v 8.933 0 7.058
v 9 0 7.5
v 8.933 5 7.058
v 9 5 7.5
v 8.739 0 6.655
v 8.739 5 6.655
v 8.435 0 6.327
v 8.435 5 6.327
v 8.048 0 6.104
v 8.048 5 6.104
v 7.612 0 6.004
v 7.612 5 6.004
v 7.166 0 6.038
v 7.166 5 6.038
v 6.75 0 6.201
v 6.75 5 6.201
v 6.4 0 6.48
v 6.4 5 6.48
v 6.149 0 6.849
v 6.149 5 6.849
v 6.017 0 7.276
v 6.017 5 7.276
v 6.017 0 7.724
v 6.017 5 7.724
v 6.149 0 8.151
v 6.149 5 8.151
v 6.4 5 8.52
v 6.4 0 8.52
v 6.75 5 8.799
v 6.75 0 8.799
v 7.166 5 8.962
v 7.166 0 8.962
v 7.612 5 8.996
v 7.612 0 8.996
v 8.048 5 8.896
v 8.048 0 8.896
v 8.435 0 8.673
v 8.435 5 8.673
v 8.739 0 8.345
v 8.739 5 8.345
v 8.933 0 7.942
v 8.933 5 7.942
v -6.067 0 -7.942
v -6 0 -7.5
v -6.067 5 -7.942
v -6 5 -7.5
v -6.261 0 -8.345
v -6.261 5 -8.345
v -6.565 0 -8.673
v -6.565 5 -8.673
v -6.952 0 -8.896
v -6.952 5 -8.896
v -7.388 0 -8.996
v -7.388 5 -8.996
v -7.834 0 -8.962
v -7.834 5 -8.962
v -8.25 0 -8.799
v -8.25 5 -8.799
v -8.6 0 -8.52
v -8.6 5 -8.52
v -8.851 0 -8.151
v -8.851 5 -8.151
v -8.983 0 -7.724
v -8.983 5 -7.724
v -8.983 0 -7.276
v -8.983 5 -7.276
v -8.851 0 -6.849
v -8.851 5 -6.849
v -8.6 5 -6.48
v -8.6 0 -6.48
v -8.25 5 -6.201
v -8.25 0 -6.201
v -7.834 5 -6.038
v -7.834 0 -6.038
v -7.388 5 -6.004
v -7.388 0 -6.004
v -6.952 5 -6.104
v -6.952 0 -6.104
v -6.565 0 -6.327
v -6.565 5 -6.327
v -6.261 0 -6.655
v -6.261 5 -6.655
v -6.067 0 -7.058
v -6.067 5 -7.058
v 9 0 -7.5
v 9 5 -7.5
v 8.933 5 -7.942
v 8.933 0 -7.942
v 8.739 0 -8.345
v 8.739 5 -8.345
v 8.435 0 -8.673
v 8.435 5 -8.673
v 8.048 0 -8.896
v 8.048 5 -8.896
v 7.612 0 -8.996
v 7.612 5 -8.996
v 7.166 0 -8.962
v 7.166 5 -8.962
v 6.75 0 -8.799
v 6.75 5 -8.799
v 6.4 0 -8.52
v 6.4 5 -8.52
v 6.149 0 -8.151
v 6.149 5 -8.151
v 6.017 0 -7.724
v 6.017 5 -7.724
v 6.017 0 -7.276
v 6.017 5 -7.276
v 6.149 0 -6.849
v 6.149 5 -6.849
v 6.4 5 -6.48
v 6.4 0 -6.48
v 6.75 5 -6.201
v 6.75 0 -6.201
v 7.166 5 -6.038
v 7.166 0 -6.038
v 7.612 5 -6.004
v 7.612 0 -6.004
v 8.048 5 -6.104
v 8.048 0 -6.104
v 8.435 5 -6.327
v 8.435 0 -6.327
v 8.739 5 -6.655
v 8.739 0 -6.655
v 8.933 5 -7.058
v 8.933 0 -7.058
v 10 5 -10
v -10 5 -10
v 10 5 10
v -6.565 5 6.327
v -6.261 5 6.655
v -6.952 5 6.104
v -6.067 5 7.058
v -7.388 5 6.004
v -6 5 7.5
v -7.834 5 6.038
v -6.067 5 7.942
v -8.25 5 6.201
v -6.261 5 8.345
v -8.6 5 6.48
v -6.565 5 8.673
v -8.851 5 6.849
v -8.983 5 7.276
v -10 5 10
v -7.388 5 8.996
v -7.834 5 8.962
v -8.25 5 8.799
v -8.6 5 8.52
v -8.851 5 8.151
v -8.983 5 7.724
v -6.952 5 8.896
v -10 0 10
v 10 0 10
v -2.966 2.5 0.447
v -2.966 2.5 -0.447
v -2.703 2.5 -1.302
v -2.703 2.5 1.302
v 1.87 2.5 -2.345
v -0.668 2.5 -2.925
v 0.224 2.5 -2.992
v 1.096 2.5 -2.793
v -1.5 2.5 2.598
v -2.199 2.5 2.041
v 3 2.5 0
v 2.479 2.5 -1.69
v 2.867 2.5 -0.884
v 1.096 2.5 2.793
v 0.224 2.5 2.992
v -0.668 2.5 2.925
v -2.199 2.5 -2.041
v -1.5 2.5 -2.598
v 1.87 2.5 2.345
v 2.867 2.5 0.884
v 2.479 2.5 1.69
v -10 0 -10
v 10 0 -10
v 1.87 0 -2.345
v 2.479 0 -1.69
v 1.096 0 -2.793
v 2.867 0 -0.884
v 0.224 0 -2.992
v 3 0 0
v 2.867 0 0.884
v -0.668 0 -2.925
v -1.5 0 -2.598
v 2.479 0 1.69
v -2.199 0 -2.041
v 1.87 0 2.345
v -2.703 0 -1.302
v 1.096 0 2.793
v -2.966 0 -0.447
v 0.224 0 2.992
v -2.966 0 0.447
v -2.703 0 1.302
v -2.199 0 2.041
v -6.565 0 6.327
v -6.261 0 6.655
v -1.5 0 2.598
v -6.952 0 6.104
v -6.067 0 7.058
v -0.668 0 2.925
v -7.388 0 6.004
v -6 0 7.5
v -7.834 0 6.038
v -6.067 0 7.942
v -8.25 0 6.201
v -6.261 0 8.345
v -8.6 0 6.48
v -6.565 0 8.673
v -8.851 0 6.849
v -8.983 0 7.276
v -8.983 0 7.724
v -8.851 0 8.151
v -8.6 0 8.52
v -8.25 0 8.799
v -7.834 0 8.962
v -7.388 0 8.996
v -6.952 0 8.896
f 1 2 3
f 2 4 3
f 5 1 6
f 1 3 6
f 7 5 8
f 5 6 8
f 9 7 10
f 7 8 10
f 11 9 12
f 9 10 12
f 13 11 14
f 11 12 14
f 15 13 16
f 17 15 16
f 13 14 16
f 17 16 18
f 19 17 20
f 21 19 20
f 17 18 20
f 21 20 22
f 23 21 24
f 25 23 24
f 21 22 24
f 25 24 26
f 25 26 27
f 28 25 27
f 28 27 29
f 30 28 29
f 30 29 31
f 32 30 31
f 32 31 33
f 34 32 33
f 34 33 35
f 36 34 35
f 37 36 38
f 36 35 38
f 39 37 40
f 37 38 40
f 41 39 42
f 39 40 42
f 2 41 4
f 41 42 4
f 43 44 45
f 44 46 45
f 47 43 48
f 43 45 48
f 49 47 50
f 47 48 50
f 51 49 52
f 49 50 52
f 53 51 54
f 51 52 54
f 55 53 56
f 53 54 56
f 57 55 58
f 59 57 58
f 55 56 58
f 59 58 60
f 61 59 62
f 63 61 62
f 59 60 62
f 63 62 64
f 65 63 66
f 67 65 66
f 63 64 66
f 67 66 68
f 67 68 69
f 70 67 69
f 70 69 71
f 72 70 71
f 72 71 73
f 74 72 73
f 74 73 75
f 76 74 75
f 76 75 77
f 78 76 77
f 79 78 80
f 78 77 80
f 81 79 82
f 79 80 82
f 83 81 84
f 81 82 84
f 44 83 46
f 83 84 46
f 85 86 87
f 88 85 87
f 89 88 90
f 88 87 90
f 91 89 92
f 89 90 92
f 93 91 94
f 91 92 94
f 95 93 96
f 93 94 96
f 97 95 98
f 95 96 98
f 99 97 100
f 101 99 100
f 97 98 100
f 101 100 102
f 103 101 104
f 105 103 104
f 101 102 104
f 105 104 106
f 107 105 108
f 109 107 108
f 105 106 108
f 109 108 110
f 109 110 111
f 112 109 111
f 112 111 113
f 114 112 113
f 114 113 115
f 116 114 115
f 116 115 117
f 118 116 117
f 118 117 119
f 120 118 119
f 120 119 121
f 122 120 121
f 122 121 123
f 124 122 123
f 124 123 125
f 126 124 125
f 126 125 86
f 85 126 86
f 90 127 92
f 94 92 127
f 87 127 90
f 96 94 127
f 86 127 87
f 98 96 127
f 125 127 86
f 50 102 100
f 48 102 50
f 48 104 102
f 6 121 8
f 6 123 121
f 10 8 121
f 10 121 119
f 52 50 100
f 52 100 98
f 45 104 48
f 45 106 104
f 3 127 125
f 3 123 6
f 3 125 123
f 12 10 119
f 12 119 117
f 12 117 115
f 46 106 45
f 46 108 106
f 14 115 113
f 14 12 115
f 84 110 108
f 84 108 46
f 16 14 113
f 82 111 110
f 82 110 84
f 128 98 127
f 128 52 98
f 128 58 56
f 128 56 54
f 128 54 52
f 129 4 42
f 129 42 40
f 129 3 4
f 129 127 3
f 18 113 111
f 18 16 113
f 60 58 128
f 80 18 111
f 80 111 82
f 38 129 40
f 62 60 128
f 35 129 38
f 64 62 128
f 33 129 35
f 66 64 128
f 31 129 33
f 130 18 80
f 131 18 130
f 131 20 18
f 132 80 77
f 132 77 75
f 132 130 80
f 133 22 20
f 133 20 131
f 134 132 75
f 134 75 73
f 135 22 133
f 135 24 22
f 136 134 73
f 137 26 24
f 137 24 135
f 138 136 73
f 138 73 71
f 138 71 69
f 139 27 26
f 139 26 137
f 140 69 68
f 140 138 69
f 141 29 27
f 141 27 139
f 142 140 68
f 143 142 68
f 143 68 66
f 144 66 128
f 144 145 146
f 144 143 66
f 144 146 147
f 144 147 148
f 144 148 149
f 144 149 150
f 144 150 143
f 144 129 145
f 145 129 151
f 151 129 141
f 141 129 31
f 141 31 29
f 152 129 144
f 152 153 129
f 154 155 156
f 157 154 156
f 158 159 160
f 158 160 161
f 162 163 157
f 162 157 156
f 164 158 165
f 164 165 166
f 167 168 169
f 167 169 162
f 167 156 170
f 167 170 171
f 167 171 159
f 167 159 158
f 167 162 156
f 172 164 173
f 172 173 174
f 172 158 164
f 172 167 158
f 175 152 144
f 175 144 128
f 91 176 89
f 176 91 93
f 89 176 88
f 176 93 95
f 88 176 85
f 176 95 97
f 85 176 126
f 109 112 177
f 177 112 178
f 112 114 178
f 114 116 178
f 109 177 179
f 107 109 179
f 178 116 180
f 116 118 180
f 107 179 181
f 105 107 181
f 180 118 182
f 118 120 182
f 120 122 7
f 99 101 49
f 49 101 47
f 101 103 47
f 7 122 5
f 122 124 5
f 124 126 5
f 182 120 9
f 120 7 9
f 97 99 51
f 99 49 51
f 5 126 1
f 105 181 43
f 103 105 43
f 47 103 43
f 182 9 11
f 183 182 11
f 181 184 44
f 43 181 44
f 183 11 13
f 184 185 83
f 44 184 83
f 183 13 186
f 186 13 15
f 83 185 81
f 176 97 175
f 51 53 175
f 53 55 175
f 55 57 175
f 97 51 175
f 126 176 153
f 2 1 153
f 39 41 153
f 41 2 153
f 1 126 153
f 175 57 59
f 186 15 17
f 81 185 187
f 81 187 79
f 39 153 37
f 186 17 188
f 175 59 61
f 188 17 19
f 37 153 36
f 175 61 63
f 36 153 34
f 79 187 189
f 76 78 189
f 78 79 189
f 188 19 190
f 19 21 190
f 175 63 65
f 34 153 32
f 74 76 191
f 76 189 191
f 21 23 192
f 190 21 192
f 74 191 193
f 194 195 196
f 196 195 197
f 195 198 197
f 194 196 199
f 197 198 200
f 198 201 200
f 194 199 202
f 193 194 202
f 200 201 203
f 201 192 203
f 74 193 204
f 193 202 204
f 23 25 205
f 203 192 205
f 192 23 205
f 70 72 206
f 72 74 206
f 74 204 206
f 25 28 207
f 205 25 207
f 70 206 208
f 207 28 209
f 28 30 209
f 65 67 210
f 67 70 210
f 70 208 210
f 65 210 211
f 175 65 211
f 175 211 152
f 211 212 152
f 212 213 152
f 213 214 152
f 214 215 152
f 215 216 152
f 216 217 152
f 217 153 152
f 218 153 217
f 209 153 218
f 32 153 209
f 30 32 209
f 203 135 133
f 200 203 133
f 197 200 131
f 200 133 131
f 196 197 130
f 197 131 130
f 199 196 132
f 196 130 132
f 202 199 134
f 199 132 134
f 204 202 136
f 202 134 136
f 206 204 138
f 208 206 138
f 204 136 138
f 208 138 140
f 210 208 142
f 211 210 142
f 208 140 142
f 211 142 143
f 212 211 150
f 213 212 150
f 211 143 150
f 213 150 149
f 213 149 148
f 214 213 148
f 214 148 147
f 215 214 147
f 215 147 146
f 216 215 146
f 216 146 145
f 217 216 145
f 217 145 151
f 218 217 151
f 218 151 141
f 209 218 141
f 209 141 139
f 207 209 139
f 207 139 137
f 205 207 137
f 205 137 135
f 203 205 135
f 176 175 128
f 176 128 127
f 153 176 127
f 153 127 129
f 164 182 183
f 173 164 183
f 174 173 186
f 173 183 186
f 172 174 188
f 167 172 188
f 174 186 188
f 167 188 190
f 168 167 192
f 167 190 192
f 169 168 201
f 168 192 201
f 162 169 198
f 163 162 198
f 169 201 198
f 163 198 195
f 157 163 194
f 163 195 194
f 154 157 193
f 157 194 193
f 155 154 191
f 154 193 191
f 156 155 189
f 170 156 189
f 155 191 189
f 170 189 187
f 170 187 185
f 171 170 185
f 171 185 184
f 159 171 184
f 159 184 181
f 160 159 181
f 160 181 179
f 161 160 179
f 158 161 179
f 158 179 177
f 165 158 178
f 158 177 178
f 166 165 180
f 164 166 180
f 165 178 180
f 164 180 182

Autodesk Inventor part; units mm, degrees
ref_plane "YZ Plane" through (0, 0, 0) normal (1, 0, 0) x (0, 1, 0)
ref_plane "XZ Plane" through (0, 0, 0) normal (0, 1, 0) x (-1, 0, 0)
ref_plane "XY Plane" through (0, 0, 0) normal (0, 0, 1) x (1, 0, 0)
sketch "Boceto1" plane through (0, 0, 0) normal (0, 1, 0) x (-1, 0, 0)
  line L0 (10, -10) -> (-10, -10)
  line L1 (-10, -10) -> (-10, 10)
  line L2 (-10, 10) -> (10, 10)
  line L3 (10, 10) -> (10, -10)
  line L4 (10, -10) -> (-10, 10) construction
  line L5 (-10, -10) -> (10, 10) construction
  point P0 (0, 0)
  dimension "d0" = 20
  dimension "d1" = 20
extrude "Extrusión1" add sketch "Boceto1" along normal blind 5
sketch "Boceto2" plane through (0, 0, 0) normal (0, -1, 0) x (1, 0, 0)
  circle A0 centre (0, 0) radius 3
  dimension "d4" = 6
extrude "Extrusión2" cut sketch "Boceto2" against normal blind 2.5
sketch "Boceto3" plane through (0, 5, 0) normal (0, 1, 0) x (1, 0, 0)
  line L0 (7.5, -7.5) -> (-7.5, -7.5)
  line L1 (-7.5, -7.5) -> (-7.5, 7.5)
  line L2 (-7.5, 7.5) -> (7.5, 7.5)
  line L3 (7.5, 7.5) -> (7.5, -7.5)
  line L4 (7.5, -7.5) -> (-7.5, 7.5) construction
  line L5 (-7.5, -7.5) -> (7.5, 7.5) construction
  circle A0 centre (-7.5, 7.5) radius 1.5
  circle A1 centre (7.5, 7.5) radius 1.5
  circle A2 centre (-7.5, -7.5) radius 1.5
  circle A3 centre (7.5, -7.5) radius 1.5
  point P0 (0, 0)
  dimension "d7" = 15
  dimension "d8" = 15
  dimension "d9" = 3
  dimension "d10" = 3
  dimension "d11" = 3
  dimension "d12" = 3
extrude "Extrusión3" cut sketch "Boceto3" against normal blind 5 contours A2 L1 L0 | L0 L1 A2 | A3 L3 L0 | L0 L3 A3 | A0 L2 L1 | L1 L2 A0 | A1 L2 L3 | L3 L2 A1
properties part number "engine_coupling" material "Plástico ABS"
